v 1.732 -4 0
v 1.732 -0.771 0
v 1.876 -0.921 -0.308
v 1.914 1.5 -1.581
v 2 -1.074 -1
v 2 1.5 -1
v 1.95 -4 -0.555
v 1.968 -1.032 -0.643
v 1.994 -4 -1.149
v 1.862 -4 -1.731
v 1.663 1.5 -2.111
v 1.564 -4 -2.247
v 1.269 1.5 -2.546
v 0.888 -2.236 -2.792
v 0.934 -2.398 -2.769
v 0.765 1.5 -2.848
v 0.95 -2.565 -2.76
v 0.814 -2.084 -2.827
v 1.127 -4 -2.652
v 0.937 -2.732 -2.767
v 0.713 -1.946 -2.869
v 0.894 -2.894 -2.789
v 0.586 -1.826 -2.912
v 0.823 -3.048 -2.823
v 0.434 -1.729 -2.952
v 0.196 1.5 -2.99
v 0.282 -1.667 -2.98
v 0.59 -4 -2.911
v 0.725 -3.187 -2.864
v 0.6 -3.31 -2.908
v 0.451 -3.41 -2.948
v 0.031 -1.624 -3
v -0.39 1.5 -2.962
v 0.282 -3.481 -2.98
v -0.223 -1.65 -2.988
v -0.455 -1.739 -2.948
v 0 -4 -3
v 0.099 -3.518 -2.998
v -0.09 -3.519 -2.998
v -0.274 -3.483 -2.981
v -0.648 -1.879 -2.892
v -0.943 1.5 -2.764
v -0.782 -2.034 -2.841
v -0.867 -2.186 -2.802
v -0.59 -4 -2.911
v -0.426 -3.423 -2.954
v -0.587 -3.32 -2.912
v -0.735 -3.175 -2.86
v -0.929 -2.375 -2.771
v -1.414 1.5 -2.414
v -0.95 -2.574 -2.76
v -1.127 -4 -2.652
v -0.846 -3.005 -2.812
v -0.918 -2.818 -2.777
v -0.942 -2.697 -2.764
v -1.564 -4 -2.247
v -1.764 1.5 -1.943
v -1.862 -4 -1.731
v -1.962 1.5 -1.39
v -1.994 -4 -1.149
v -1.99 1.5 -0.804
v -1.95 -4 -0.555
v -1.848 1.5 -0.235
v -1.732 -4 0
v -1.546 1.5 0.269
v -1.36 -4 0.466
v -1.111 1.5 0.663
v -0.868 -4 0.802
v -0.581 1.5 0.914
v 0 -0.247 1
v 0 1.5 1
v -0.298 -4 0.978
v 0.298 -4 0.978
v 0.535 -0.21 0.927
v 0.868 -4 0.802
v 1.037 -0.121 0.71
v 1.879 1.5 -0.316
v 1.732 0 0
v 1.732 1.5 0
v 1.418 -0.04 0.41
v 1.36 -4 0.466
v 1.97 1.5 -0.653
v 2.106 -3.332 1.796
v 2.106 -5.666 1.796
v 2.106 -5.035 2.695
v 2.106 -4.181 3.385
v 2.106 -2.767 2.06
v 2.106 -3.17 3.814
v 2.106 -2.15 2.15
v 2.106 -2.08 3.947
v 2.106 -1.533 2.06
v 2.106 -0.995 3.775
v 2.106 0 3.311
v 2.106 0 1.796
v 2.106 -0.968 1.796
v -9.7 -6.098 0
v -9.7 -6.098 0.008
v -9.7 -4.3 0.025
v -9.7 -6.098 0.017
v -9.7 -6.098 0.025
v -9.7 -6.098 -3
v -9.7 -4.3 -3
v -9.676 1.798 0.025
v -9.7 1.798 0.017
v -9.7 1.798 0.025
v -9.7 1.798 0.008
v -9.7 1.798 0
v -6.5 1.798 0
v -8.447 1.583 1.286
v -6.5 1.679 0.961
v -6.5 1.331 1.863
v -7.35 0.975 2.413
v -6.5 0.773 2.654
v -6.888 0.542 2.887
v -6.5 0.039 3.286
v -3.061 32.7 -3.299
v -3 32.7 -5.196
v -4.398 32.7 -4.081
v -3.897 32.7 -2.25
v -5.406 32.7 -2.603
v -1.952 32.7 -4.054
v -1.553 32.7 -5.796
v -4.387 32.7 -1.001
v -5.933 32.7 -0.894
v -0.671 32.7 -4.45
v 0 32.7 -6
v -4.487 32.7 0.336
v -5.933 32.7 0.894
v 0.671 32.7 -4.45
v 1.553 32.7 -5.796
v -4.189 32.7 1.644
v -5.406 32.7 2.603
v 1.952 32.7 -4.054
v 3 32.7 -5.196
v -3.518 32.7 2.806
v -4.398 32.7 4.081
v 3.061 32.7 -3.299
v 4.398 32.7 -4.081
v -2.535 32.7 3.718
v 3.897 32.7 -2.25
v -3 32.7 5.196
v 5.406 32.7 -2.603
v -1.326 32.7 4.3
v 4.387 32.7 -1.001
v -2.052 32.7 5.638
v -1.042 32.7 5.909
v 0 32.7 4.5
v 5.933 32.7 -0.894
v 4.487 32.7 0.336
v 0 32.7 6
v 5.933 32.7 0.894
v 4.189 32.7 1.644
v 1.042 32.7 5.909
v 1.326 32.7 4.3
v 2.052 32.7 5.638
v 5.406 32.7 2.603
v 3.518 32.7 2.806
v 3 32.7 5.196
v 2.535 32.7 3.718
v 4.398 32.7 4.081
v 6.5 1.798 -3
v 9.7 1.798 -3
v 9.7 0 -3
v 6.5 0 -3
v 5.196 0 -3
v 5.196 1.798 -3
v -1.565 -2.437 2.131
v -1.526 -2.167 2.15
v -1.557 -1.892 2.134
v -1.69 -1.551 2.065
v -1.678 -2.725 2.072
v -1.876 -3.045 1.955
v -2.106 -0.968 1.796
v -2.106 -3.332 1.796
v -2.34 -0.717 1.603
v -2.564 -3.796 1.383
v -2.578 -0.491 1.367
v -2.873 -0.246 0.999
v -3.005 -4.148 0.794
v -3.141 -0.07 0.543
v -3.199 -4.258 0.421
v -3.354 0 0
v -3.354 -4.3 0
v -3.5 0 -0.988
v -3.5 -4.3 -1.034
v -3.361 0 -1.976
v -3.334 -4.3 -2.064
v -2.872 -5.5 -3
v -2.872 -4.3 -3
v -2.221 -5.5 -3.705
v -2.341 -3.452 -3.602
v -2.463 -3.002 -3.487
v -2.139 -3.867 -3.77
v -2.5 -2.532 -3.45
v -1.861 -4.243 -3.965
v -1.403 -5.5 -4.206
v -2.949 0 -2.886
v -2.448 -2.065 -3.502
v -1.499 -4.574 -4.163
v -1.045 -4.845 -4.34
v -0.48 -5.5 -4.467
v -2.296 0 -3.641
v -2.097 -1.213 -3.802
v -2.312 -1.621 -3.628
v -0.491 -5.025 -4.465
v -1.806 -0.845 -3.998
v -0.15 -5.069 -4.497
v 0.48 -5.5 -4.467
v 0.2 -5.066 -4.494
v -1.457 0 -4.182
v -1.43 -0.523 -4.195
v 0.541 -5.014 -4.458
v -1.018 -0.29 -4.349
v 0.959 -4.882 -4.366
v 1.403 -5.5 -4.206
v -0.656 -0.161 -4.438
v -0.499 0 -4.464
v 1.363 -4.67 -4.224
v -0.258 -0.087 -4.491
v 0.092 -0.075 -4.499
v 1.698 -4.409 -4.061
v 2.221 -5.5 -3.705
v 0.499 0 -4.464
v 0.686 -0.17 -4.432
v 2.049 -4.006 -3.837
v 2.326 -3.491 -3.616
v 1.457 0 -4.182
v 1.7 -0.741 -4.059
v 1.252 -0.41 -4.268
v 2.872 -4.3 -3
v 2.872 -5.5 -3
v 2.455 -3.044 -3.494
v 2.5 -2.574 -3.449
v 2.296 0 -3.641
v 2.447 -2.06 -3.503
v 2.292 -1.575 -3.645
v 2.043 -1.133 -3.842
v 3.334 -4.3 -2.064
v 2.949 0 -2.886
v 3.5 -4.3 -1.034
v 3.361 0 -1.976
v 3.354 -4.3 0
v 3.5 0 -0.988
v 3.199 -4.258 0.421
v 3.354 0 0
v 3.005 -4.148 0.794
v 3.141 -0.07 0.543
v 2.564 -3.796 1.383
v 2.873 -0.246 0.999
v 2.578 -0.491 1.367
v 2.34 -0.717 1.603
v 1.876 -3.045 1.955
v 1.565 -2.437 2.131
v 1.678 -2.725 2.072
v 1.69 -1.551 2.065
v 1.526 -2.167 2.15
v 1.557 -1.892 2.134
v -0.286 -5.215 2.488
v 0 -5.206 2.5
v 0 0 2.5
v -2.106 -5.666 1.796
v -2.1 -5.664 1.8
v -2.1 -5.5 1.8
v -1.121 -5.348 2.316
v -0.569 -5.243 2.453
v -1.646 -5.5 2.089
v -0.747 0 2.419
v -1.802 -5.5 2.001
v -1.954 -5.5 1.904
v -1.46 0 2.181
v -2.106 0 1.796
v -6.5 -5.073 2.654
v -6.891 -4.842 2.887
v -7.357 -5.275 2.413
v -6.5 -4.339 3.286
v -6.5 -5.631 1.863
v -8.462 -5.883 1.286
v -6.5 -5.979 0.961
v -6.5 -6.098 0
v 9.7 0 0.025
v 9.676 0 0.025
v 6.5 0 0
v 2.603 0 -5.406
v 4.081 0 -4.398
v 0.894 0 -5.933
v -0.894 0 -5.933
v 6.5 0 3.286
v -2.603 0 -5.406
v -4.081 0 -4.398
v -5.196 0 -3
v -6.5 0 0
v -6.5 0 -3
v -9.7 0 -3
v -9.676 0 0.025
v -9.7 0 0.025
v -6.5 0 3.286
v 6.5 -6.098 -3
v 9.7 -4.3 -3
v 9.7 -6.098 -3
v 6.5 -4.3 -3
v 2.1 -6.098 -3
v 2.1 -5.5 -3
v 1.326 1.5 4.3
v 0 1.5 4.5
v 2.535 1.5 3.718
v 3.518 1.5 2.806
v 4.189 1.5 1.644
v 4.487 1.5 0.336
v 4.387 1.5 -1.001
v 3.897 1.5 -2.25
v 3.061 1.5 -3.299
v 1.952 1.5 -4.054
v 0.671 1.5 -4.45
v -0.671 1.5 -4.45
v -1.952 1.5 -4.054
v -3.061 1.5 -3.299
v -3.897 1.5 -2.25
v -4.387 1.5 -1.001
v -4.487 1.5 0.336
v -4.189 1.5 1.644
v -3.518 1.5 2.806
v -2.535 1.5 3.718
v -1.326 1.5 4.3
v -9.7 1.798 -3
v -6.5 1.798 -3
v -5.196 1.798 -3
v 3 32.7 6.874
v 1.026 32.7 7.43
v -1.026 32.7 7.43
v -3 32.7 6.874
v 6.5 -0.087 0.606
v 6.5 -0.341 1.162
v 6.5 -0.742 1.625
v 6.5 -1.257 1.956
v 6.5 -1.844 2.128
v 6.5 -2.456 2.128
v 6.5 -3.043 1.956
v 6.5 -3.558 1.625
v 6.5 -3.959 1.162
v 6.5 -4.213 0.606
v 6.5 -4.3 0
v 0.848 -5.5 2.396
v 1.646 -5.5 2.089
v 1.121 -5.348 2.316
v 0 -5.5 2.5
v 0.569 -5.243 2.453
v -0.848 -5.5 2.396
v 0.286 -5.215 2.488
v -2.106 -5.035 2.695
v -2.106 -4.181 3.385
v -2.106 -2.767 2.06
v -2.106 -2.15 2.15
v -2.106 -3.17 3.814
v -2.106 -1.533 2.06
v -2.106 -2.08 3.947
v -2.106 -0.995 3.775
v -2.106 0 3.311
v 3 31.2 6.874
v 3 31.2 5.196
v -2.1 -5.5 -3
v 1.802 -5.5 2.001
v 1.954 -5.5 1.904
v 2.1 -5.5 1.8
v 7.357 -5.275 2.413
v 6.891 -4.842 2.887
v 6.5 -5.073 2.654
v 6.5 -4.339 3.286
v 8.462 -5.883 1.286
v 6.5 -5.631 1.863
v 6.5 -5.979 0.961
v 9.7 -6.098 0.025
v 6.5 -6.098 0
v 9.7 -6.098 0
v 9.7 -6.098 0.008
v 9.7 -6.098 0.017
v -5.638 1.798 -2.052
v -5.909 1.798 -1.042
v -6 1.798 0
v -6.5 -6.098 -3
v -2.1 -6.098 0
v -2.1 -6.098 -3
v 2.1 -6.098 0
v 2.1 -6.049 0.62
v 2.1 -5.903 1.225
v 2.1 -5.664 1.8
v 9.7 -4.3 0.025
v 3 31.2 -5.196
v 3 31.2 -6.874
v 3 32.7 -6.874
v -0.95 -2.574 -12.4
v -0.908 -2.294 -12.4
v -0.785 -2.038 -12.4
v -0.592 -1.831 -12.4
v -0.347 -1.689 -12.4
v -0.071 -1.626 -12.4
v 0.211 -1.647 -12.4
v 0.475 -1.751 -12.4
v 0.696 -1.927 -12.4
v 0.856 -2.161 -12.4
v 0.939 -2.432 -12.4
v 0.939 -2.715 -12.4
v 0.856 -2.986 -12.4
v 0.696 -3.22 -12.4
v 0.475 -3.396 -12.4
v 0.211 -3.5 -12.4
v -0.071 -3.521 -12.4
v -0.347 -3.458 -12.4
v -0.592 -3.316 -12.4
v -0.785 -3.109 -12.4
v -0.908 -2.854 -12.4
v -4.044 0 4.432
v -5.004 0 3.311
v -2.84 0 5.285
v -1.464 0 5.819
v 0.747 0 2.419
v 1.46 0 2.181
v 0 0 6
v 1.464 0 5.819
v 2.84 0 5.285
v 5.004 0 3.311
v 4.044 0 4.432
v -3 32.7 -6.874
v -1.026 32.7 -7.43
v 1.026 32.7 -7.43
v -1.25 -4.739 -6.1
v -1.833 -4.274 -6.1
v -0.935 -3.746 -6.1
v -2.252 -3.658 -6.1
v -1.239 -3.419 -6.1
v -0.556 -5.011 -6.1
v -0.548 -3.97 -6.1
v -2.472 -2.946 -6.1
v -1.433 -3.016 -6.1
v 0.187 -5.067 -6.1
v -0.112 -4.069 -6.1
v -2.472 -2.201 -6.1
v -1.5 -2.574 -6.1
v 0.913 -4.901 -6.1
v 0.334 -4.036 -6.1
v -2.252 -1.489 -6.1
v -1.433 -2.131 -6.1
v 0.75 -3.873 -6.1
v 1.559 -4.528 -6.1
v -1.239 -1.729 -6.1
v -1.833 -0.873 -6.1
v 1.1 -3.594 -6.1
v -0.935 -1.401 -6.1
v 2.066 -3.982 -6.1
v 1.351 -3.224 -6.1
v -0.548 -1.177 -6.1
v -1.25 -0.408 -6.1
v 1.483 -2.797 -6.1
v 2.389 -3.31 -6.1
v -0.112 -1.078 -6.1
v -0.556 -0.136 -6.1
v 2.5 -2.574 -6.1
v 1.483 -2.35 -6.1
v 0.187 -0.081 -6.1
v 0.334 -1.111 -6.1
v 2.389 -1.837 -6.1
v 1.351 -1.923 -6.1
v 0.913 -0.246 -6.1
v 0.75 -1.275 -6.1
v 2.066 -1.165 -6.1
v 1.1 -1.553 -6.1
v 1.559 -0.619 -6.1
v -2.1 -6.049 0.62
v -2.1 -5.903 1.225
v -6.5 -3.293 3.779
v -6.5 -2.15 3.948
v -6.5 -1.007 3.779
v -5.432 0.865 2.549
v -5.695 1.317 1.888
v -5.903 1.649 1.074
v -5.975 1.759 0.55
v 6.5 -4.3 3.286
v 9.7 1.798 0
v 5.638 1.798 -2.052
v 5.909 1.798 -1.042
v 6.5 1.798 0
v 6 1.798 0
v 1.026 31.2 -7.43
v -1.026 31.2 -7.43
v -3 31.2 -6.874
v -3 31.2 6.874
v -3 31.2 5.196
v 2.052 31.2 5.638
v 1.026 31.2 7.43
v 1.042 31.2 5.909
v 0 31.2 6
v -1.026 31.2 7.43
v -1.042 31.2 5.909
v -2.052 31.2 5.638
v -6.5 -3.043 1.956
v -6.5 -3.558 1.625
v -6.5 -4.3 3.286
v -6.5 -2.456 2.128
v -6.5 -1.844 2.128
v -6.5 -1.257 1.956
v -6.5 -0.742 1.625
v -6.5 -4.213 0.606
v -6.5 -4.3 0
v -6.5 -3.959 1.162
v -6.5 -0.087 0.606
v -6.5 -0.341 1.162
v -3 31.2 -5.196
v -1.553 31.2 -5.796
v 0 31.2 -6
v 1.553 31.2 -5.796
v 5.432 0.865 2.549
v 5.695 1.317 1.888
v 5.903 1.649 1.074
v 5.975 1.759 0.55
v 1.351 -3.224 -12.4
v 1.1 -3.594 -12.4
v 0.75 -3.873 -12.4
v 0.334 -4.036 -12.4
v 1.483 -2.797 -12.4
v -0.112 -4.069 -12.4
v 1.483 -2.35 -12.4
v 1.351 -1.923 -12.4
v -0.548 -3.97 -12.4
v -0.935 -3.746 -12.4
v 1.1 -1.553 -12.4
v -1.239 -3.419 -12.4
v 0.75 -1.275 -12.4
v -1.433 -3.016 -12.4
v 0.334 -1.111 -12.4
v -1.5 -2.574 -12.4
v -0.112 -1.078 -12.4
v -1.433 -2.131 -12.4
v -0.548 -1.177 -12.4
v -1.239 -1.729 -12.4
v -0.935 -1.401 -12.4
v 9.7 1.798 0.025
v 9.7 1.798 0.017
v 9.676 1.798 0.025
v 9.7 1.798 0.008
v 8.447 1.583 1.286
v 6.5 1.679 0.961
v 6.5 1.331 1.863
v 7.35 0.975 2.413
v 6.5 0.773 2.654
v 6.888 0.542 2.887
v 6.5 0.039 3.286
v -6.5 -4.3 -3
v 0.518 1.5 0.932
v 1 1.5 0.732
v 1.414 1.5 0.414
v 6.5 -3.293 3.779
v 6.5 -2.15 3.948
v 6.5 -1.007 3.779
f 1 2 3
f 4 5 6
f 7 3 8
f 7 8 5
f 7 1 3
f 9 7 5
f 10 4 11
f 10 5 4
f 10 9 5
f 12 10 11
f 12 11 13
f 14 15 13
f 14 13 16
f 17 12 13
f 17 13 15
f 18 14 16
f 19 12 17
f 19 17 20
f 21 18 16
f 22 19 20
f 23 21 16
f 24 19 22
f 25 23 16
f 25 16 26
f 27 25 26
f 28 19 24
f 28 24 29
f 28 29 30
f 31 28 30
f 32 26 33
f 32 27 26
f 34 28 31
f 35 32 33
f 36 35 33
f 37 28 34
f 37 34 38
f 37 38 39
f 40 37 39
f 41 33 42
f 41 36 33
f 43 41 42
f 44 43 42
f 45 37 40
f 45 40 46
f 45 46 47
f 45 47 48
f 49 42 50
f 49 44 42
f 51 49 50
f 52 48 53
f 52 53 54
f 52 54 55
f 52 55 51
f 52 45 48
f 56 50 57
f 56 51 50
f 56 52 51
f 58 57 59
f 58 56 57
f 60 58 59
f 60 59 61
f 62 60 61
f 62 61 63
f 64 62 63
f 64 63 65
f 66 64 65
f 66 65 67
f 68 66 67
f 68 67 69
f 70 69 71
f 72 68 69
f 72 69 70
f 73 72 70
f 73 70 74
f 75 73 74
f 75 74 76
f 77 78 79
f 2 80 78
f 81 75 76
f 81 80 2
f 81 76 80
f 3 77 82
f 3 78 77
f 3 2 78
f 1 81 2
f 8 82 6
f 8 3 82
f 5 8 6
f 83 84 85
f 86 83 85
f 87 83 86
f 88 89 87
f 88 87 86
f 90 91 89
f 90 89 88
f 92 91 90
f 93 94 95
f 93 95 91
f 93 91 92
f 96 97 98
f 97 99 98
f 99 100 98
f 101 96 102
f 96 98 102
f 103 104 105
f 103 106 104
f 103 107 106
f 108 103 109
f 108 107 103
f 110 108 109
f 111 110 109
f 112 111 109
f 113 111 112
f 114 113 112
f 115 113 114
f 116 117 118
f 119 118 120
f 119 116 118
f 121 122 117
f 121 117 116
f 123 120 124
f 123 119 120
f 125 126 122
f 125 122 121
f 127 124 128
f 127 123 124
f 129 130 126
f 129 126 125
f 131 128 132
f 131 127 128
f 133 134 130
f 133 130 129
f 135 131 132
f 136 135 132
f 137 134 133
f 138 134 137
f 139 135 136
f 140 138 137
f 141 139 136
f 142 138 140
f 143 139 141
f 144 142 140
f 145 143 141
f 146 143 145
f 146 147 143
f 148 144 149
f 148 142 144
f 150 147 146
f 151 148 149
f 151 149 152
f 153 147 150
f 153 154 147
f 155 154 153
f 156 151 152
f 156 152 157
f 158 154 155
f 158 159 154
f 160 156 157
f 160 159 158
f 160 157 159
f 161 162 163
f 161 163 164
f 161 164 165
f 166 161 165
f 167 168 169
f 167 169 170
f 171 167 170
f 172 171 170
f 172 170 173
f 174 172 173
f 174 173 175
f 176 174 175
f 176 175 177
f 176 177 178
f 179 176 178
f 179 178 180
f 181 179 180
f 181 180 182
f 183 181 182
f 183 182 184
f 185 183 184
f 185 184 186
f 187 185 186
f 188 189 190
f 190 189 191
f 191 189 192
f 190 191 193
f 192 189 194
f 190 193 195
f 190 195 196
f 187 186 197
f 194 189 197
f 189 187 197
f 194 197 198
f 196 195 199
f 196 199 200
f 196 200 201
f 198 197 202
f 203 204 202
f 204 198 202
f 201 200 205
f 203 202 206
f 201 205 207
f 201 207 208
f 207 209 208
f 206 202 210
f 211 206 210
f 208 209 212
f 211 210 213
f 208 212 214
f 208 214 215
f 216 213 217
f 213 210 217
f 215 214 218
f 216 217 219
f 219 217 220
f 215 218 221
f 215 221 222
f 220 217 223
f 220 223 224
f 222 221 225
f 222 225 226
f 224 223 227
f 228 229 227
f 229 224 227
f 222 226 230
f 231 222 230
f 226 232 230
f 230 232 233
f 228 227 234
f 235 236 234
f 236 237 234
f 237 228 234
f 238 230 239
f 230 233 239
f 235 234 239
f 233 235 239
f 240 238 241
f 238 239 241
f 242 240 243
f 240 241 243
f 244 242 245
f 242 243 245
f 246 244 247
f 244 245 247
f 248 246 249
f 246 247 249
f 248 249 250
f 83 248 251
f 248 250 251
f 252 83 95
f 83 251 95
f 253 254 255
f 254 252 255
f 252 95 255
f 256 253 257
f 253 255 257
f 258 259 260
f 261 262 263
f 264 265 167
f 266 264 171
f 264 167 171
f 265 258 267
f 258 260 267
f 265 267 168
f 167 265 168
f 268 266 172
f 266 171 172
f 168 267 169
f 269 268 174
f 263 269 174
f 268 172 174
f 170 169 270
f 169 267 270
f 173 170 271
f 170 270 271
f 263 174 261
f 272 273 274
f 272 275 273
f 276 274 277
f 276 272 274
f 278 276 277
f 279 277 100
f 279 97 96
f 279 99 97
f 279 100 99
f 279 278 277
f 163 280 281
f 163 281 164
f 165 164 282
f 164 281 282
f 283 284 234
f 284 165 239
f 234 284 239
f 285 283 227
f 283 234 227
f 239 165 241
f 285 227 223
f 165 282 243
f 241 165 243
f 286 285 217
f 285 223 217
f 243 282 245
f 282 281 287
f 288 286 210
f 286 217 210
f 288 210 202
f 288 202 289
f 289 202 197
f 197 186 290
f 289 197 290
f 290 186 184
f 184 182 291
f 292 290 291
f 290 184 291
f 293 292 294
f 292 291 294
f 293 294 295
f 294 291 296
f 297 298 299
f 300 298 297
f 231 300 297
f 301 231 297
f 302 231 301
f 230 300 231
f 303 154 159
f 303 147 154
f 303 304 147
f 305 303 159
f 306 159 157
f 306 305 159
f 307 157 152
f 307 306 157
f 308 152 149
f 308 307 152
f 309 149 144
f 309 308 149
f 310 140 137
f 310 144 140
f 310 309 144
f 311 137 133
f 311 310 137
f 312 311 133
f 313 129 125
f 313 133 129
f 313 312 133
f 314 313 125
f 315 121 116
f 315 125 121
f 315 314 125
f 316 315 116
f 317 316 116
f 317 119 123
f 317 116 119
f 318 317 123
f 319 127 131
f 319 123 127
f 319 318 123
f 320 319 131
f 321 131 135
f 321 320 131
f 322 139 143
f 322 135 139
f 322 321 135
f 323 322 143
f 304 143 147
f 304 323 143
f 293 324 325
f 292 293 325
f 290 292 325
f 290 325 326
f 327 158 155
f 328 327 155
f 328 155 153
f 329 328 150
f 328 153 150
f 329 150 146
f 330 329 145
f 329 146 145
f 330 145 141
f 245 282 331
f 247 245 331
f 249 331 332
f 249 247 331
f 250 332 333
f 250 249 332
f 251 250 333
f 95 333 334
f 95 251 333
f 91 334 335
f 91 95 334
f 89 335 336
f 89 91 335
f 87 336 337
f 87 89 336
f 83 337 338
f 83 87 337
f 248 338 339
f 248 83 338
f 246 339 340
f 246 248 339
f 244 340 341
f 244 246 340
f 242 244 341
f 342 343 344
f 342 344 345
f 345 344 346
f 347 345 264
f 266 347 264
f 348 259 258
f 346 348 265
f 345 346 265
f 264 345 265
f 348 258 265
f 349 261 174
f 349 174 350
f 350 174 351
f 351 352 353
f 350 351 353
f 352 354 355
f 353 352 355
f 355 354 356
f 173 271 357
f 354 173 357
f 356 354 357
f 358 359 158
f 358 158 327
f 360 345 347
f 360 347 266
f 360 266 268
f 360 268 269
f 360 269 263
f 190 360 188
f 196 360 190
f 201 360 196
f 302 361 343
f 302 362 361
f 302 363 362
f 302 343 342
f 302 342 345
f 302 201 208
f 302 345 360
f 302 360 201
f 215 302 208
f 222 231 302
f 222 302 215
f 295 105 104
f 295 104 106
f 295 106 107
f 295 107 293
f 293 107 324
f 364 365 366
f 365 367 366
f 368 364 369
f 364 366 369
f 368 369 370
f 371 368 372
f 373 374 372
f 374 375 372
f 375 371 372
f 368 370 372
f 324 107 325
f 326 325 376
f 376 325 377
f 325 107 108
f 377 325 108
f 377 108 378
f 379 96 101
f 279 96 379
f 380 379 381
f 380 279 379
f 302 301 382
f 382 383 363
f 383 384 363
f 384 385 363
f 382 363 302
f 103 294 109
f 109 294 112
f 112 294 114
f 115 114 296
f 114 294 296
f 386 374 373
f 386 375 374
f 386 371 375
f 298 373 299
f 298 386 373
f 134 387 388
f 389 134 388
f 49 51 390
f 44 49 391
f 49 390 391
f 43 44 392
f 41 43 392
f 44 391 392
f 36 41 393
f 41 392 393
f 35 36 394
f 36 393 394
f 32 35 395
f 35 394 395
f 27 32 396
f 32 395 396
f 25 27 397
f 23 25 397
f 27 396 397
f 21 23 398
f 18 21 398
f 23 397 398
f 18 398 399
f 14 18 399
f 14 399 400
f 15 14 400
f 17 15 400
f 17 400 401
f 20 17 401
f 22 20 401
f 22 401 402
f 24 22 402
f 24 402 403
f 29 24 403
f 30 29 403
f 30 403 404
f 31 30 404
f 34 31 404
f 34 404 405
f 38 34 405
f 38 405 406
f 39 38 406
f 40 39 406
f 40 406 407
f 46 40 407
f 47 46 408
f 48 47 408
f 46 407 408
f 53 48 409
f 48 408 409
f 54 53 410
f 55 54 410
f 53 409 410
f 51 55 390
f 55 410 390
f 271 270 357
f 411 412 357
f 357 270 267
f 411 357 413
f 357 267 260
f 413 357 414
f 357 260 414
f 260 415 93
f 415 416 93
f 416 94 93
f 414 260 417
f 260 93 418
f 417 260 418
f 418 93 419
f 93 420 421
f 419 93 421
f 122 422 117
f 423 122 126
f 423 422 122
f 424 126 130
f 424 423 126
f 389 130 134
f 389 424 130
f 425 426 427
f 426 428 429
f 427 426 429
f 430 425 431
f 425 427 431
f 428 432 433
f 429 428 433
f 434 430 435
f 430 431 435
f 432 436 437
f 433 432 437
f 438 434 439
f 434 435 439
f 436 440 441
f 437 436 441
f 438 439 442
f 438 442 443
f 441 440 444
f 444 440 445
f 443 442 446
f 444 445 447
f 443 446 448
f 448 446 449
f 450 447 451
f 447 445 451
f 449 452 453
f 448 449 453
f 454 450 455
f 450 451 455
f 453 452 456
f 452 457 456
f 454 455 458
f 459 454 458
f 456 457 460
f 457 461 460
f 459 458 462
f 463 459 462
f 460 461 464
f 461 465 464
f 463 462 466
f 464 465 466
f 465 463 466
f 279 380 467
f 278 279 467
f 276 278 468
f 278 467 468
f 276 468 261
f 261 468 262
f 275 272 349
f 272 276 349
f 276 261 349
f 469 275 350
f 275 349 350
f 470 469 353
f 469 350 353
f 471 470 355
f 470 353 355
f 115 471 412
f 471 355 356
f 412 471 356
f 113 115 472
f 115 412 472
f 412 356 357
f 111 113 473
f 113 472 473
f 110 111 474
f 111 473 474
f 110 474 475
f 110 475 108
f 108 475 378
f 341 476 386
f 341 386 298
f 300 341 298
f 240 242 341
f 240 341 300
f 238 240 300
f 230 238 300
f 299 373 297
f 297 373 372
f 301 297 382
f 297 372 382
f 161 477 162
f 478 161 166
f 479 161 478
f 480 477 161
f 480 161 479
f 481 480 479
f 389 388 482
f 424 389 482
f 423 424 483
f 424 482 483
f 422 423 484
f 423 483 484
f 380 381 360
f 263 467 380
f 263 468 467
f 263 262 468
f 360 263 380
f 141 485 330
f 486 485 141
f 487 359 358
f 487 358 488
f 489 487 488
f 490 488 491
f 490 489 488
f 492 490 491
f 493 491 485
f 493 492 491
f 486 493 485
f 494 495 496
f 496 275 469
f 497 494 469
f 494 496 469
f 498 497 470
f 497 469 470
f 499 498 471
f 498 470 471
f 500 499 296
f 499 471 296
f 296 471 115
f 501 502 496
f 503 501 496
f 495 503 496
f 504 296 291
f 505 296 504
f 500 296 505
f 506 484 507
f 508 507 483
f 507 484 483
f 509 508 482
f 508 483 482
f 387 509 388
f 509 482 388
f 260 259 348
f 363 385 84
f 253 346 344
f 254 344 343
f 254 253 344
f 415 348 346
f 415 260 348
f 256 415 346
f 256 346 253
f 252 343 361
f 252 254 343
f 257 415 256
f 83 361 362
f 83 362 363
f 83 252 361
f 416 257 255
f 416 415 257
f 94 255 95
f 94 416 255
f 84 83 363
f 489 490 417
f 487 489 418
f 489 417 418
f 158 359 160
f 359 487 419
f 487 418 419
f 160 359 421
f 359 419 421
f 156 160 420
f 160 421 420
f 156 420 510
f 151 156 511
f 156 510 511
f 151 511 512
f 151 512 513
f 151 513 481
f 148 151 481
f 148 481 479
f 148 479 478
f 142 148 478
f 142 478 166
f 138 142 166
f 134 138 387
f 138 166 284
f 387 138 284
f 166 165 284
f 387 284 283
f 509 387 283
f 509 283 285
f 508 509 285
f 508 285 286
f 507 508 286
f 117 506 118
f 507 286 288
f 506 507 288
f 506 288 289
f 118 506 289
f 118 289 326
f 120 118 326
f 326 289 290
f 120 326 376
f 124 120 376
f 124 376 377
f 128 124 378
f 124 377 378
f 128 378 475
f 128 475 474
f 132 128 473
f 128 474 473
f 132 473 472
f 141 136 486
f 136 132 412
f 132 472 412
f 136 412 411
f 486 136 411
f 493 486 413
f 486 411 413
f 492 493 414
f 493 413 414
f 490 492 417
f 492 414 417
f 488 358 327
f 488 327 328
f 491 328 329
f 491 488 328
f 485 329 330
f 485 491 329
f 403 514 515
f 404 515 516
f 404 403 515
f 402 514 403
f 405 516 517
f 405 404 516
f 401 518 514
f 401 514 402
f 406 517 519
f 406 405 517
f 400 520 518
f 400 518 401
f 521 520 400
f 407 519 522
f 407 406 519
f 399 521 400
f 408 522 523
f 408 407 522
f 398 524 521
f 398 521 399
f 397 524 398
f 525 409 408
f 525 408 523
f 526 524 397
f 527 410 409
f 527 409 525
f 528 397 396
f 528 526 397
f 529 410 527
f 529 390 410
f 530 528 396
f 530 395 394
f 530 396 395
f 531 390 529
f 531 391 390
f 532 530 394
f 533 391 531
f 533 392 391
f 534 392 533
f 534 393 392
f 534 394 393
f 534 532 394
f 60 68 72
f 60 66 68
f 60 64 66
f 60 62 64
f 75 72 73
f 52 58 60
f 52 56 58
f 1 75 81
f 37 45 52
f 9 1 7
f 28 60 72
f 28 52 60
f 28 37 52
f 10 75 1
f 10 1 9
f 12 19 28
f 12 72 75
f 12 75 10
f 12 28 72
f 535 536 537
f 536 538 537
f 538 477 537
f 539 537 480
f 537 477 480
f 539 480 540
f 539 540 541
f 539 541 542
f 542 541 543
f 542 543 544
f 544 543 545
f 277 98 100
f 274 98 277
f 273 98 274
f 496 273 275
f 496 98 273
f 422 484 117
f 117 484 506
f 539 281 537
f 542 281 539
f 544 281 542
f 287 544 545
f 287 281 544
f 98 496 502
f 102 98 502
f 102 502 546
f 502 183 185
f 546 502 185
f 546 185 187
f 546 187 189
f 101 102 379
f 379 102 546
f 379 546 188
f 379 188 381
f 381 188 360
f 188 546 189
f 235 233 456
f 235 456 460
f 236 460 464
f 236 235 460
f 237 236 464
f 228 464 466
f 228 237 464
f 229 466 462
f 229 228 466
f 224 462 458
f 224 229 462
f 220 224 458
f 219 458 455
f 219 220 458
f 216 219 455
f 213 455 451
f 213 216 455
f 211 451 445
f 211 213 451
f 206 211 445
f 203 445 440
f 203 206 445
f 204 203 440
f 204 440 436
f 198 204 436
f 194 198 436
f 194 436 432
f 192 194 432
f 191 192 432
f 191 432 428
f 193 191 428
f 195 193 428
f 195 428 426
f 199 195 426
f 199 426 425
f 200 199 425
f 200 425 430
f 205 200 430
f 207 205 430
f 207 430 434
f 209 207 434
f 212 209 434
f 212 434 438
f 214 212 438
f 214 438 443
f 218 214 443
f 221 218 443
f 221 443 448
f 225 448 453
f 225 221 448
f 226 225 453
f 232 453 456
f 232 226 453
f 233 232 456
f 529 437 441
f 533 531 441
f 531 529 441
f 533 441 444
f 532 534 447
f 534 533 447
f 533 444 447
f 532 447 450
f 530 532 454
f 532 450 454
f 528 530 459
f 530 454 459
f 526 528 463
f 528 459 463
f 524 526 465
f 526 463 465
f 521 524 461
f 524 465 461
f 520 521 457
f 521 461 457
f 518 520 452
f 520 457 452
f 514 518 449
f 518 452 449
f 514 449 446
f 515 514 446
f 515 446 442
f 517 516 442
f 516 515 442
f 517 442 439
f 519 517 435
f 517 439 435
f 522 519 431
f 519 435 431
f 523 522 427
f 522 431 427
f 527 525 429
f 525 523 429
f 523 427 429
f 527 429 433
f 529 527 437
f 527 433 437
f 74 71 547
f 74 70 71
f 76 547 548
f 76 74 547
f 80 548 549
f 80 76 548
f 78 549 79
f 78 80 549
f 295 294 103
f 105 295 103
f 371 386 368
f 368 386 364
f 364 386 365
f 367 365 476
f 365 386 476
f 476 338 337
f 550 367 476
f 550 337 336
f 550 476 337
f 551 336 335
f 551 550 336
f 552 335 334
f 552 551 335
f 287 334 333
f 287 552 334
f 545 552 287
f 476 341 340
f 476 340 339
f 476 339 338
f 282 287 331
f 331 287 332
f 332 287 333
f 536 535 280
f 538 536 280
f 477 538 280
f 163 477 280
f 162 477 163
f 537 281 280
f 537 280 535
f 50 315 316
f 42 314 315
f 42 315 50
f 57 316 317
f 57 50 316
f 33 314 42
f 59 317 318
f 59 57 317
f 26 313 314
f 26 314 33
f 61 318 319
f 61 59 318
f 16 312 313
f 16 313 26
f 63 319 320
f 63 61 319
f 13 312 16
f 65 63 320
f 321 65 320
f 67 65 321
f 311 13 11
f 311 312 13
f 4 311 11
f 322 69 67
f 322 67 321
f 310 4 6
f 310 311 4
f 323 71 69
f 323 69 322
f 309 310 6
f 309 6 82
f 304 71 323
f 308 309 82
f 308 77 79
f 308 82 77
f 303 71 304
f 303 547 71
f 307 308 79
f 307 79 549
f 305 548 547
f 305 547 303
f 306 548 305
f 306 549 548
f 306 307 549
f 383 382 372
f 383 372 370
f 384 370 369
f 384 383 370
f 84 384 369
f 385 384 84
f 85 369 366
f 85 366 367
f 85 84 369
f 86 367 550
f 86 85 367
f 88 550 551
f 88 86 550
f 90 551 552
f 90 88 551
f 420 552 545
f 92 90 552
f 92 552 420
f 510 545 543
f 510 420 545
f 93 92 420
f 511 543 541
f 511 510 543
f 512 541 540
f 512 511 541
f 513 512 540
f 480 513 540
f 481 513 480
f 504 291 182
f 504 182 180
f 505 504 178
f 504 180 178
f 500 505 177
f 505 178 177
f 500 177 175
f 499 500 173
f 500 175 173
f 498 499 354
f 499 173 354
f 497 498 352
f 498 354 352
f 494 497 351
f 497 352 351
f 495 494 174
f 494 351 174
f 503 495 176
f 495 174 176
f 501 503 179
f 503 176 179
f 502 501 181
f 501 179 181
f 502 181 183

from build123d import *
from build123d.topology import SkipClean

# Parameters (mm, degrees)
SKETCH1_R            = 6
BOSS_EXTRUDE1_DEPTH  = 32.7
SHELL1_T             = -1.5
SKETCH2_R            = 3.5
BOSS_EXTRUDE3_DEPTH  = 5.5
SHELL3_START         = -4
SHELL3_OUTLINE_R     = 2
SHELL3_DEPTH         = 5.5
SKETCH4_R            = 2.5
BOSS_EXTRUDE4_DEPTH  = 6.1
SKETCH7_R            = 1.5
BOSS_EXTRUDE6_DEPTH  = 6.3
SKETCH8_R            = 0.95
CUT_EXTRUDE1_DEPTH   = 12.3
SKETCH9_R            = 2
CUT_EXTRUDE2_DEPTH   = 40.200127551
BOSS_EXTRUDE7_DEPTH  = 6.5
SKETCH11_W           = 2.1
SKETCH11_H           = 4.759411023
CUT_EXTRUDE3_DEPTH   = 41.684763873
CUT_EXTRUDE4_DEPTH   = 36.571055794
SKETCH13_W           = 4.4
SKETCH13_H           = 1.797977648
BOSS_EXTRUDE8_DEPTH  = 3
SKETCH15_W           = 4.39606385
SKETCH15_H           = 1.797977648
BOSS_EXTRUDE9_DEPTH  = 3
SKETCH16_R           = 2
CUT_EXTRUDE5_DEPTH   = 40.279765925
SKETCH17_R           = 4.5
CUT_EXTRUDE6_DEPTH   = 35.197222256
SKETCH18_W           = 3.024802645
SKETCH18_H           = 1.797977648
BOSS_EXTRUDE10_DEPTH = 3.2
BOSS_EXTRUDE11_DEPTH = 1.797977648
CUT_EXTRUDE11_DEPTH  = 38.138928519
BOSS_EXTRUDE12_DEPTH = 1.797977648
CUT_EXTRUDE12_DEPTH  = 38.138928519
BOSS_EXTRUDE13_START = -1.5
BOSS_EXTRUDE13_DEPTH = 1.5


# Read off the part's stored shape, not the designer's step: Shell3
with BuildPart() as part:
    # Sketch1 → Boss-Extrude1 (new body)
    with BuildSketch(Plane(origin=(0, 0, 0), x_dir=(1, 0, 0), z_dir=(0, 1, 0))):
        with Locations(Location((0, 0, 0), (0, 0, 270))):
            Circle(SKETCH1_R)
    extrude(amount=BOSS_EXTRUDE1_DEPTH)

    # Shell1
    shell1_openings = [part.faces().sort_by_distance(p)[0] for p in [
        (0, 32.7, 0),
    ]]
    offset(amount=SHELL1_T, openings=shell1_openings, kind=Kind.INTERSECTION)

    # Sketch2 → Boss-Extrude3 (add)
    with BuildSketch(Plane.XZ):
        with Locations(Location((0, -1, 0), (0, 0, 270))):
            Circle(SKETCH2_R)
    extrude(amount=BOSS_EXTRUDE3_DEPTH)

    # Shell3 outline → Shell3 (cut)
    with BuildSketch(Plane(origin=(0, 0, 0), x_dir=(1, 0, 0), z_dir=(0, 1, 0)).offset(SHELL3_START)):
        with Locations((0, 1)):
            Circle(SHELL3_OUTLINE_R)
    extrude(amount=SHELL3_DEPTH, mode=Mode.SUBTRACT)

    # Sketch4 → Boss-Extrude4 (add)
    with BuildSketch(Plane.XY):
        with Locations((0, -2.573540176)):
            Circle(SKETCH4_R)
    extrude(amount=-BOSS_EXTRUDE4_DEPTH)

    # Sketch7 → Boss-Extrude6 (add)
    with BuildSketch(Plane(origin=(0, 0, -6.1), x_dir=(-1, 0, 0), z_dir=(0, 0, -1))):
        with Locations((0, -2.573540176)):
            Circle(SKETCH7_R)
    extrude(amount=BOSS_EXTRUDE6_DEPTH)

    # Sketch8 → Cut-Extrude1 (cut)
    with BuildSketch(Plane(origin=(0, 0, -12.4), x_dir=(-1, 0, 0), z_dir=(0, 0, -1))):
        with Locations((0, -2.573540176)):
            Circle(SKETCH8_R)
    extrude(amount=-CUT_EXTRUDE1_DEPTH, mode=Mode.SUBTRACT)

    # Sketch9 → Cut-Extrude2 (cut, through all)
    with BuildSketch(Plane(origin=(0, -4, 0), x_dir=(1, 0, 0), z_dir=(0, 1, 0))):
        with Locations(Location((0, 1, 0), (0, 0, 270))):
            Circle(SKETCH9_R)
    extrude(amount=CUT_EXTRUDE2_DEPTH, mode=Mode.SUBTRACT)

    # Sketch10 → Boss-Extrude7 (add)
    with BuildSketch(Plane(origin=(0, 0, 0), x_dir=(0, 0, -1), z_dir=(1, 0, 0))):
        with BuildLine():
            Line((0, -4.3), (0, -6.097977648))
            ThreePointArc((0, -6.097977648), (-3.947977648, -2.15), (0, 1.797977648))
            Line((0, 1.797977648), (0, 0))
            ThreePointArc((0, 0), (-2.15, -2.15), (0, -4.3))
        make_face()
    extrude(amount=BOSS_EXTRUDE7_DEPTH)

    # Sketch11 → Cut-Extrude3 (cut, through all)
    with BuildSketch(Plane.XZ.offset(5.5)):
        with Locations((1.05, 2.379705512)):
            Rectangle(SKETCH11_W, SKETCH11_H)
    extrude(amount=CUT_EXTRUDE3_DEPTH, mode=Mode.SUBTRACT)

    # Sketch12 → Cut-Extrude4 (cut, through all)
    with BuildSketch(Plane.XZ):
        with BuildLine():
            Line((2.105734518, 1.795689922), (2.105734518, 3.947977648))
            Line((2.105734518, 3.947977648), (0, 3.947977648))
            Line((0, 3.947977648), (0, 2.5))
            ThreePointArc((0, 2.5), (1.110199368, 2.319255544), (2.105734518, 1.795689922))
        make_face()
    extrude(amount=CUT_EXTRUDE4_DEPTH, mode=Mode.SUBTRACT)

    # Sketch13 → Boss-Extrude8 (add)
    with BuildSketch(Plane(origin=(0, 0, 0), x_dir=(-1, 0, 0), z_dir=(0, 0, -1))):
        with Locations((-4.3, -5.198988824)):
            Rectangle(SKETCH13_W, SKETCH13_H)
    extrude(amount=BOSS_EXTRUDE8_DEPTH)

    # Sketch15 → Boss-Extrude9 (add)
    with SkipClean():  # the faces are left unmerged after this step: merging them gives an invalid solid
        with BuildSketch(Plane(origin=(0, 0, 0), x_dir=(-1, 0, 0), z_dir=(0, 0, -1))):
            with Locations((-4.301968075, 0.898988824)):
                Rectangle(SKETCH15_W, SKETCH15_H)
        extrude(amount=BOSS_EXTRUDE9_DEPTH)

    # Sketch16 → Cut-Extrude5 (cut, through all)
    with SkipClean():  # the faces are left unmerged after this step: merging them gives an invalid solid
        with BuildSketch(Plane(origin=(0, -4, 0), x_dir=(1, 0, 0), z_dir=(0, 1, 0))):
            with Locations(Location((0, 1, 0), (0, 0, 270))):
                Circle(SKETCH16_R)
        extrude(amount=CUT_EXTRUDE5_DEPTH, mode=Mode.SUBTRACT)

    # Sketch17 → Cut-Extrude6 (cut, through all)
    with SkipClean():  # the faces are left unmerged after this step: merging them gives an invalid solid
        with BuildSketch(Plane(origin=(0, 1.5, 0), x_dir=(1, 0, 0), z_dir=(0, 1, 0))):
            with Locations(Location((0, 0, 0), (0, 0, 270))):
                Circle(SKETCH17_R)
        extrude(amount=CUT_EXTRUDE6_DEPTH, mode=Mode.SUBTRACT)

    # Sketch18 → Boss-Extrude10 (add)
    with SkipClean():  # the faces are left unmerged after this step: merging them gives an invalid solid
        with BuildSketch(Plane(origin=(6.5, 0, 0), x_dir=(0, 0, -1), z_dir=(1, 0, 0))):
            with Locations((1.487598678, 0.898988824)):
                Rectangle(SKETCH18_W, SKETCH18_H)
            with Locations((1.487598678, -5.198988824)):
                Rectangle(SKETCH18_W, SKETCH18_H)
        extrude(amount=BOSS_EXTRUDE10_DEPTH)

    # Sketch19 → Boss-Extrude11 (add)
    with SkipClean():  # the faces are left unmerged after this step: merging them gives an invalid solid
        with BuildSketch(Plane(origin=(0, -4.3, 0), x_dir=(1, 0, 0), z_dir=(0, 1, 0))):
            Polygon((6.5, -3.285642739), (6.5, 0), (9.7, -0.024802645), align=None)
        extrude(amount=-BOSS_EXTRUDE11_DEPTH)

    # Sketch22 → Cut-Extrude11 (cut, through all)
    with SkipClean():  # the faces are left unmerged after this step: merging them gives an invalid solid
        with BuildSketch(Plane.ZY.offset(-6.5)):
            with BuildLine():
                Line((0, -6.097977648), (3.285642739, -6.097977648))
                Line((3.285642739, -6.097977648), (3.285642739, -4.33885342))
                ThreePointArc((3.285642739, -4.33885342), (1.863462252, -5.630522366), (0, -6.097977648))
            make_face()
        extrude(amount=-CUT_EXTRUDE11_DEPTH, mode=Mode.SUBTRACT)

    # Sketch24 → Boss-Extrude12 (add)
    with SkipClean():  # the faces are left unmerged after this step: merging them gives an invalid solid
        with BuildSketch(Plane.XZ):
            Polygon((9.7, 0), (6.5, 3.285642739), (6.5, 0.012401323), align=None)
        extrude(amount=-BOSS_EXTRUDE12_DEPTH)

    # Sketch25 → Cut-Extrude12 (cut, through all)
    with SkipClean():  # the faces are left unmerged after this step: merging them gives an invalid solid
        with BuildSketch(Plane.ZY.offset(-6.5)):
            with BuildLine():
                Line((3.285642739, 0.03885342), (3.285642739, 1.797977648))
                Line((3.285642739, 1.797977648), (0, 1.797977648))
                ThreePointArc((0, 1.797977648), (1.863462252, 1.330522366), (3.285642739, 0.03885342))
            make_face()
        extrude(amount=-CUT_EXTRUDE12_DEPTH, mode=Mode.SUBTRACT)

    # Mirror3: part across plane


with BuildPart() as part_1:
    add(part.part)
    add(part.part.mirror(Plane(origin=(0, 0, 0), x_dir=(0, 0, 1), z_dir=(1, 0, 0))))

    # Sketch26 → Boss-Extrude13 (add)
    with SkipClean():  # the faces are left unmerged after this step: merging them gives an invalid solid
        with BuildSketch(Plane(origin=(0, 32.7, 0), x_dir=(1, 0, 0), z_dir=(0, 1, 0)).offset(BOSS_EXTRUDE13_START)):
            with BuildLine():
                Line((3, 5.196152423), (3, 6.873863542))
                ThreePointArc((3, 6.873863542), (0, 7.5), (-3, 6.873863542))
                Line((-3, 6.873863542), (-3, 5.196152423))
                ThreePointArc((-3, 5.196152423), (0, 6), (3, 5.196152423))
            make_face()
            with BuildLine():
                Line((3, -5.196152423), (3, -6.873863542))
                ThreePointArc((3, -6.873863542), (0, -7.5), (-3, -6.873863542))
                Line((-3, -6.873863542), (-3, -5.196152423))
                ThreePointArc((-3, -5.196152423), (0, -6), (3, -5.196152423))
            make_face()
        extrude(amount=BOSS_EXTRUDE13_DEPTH)


solid = part_1.part
